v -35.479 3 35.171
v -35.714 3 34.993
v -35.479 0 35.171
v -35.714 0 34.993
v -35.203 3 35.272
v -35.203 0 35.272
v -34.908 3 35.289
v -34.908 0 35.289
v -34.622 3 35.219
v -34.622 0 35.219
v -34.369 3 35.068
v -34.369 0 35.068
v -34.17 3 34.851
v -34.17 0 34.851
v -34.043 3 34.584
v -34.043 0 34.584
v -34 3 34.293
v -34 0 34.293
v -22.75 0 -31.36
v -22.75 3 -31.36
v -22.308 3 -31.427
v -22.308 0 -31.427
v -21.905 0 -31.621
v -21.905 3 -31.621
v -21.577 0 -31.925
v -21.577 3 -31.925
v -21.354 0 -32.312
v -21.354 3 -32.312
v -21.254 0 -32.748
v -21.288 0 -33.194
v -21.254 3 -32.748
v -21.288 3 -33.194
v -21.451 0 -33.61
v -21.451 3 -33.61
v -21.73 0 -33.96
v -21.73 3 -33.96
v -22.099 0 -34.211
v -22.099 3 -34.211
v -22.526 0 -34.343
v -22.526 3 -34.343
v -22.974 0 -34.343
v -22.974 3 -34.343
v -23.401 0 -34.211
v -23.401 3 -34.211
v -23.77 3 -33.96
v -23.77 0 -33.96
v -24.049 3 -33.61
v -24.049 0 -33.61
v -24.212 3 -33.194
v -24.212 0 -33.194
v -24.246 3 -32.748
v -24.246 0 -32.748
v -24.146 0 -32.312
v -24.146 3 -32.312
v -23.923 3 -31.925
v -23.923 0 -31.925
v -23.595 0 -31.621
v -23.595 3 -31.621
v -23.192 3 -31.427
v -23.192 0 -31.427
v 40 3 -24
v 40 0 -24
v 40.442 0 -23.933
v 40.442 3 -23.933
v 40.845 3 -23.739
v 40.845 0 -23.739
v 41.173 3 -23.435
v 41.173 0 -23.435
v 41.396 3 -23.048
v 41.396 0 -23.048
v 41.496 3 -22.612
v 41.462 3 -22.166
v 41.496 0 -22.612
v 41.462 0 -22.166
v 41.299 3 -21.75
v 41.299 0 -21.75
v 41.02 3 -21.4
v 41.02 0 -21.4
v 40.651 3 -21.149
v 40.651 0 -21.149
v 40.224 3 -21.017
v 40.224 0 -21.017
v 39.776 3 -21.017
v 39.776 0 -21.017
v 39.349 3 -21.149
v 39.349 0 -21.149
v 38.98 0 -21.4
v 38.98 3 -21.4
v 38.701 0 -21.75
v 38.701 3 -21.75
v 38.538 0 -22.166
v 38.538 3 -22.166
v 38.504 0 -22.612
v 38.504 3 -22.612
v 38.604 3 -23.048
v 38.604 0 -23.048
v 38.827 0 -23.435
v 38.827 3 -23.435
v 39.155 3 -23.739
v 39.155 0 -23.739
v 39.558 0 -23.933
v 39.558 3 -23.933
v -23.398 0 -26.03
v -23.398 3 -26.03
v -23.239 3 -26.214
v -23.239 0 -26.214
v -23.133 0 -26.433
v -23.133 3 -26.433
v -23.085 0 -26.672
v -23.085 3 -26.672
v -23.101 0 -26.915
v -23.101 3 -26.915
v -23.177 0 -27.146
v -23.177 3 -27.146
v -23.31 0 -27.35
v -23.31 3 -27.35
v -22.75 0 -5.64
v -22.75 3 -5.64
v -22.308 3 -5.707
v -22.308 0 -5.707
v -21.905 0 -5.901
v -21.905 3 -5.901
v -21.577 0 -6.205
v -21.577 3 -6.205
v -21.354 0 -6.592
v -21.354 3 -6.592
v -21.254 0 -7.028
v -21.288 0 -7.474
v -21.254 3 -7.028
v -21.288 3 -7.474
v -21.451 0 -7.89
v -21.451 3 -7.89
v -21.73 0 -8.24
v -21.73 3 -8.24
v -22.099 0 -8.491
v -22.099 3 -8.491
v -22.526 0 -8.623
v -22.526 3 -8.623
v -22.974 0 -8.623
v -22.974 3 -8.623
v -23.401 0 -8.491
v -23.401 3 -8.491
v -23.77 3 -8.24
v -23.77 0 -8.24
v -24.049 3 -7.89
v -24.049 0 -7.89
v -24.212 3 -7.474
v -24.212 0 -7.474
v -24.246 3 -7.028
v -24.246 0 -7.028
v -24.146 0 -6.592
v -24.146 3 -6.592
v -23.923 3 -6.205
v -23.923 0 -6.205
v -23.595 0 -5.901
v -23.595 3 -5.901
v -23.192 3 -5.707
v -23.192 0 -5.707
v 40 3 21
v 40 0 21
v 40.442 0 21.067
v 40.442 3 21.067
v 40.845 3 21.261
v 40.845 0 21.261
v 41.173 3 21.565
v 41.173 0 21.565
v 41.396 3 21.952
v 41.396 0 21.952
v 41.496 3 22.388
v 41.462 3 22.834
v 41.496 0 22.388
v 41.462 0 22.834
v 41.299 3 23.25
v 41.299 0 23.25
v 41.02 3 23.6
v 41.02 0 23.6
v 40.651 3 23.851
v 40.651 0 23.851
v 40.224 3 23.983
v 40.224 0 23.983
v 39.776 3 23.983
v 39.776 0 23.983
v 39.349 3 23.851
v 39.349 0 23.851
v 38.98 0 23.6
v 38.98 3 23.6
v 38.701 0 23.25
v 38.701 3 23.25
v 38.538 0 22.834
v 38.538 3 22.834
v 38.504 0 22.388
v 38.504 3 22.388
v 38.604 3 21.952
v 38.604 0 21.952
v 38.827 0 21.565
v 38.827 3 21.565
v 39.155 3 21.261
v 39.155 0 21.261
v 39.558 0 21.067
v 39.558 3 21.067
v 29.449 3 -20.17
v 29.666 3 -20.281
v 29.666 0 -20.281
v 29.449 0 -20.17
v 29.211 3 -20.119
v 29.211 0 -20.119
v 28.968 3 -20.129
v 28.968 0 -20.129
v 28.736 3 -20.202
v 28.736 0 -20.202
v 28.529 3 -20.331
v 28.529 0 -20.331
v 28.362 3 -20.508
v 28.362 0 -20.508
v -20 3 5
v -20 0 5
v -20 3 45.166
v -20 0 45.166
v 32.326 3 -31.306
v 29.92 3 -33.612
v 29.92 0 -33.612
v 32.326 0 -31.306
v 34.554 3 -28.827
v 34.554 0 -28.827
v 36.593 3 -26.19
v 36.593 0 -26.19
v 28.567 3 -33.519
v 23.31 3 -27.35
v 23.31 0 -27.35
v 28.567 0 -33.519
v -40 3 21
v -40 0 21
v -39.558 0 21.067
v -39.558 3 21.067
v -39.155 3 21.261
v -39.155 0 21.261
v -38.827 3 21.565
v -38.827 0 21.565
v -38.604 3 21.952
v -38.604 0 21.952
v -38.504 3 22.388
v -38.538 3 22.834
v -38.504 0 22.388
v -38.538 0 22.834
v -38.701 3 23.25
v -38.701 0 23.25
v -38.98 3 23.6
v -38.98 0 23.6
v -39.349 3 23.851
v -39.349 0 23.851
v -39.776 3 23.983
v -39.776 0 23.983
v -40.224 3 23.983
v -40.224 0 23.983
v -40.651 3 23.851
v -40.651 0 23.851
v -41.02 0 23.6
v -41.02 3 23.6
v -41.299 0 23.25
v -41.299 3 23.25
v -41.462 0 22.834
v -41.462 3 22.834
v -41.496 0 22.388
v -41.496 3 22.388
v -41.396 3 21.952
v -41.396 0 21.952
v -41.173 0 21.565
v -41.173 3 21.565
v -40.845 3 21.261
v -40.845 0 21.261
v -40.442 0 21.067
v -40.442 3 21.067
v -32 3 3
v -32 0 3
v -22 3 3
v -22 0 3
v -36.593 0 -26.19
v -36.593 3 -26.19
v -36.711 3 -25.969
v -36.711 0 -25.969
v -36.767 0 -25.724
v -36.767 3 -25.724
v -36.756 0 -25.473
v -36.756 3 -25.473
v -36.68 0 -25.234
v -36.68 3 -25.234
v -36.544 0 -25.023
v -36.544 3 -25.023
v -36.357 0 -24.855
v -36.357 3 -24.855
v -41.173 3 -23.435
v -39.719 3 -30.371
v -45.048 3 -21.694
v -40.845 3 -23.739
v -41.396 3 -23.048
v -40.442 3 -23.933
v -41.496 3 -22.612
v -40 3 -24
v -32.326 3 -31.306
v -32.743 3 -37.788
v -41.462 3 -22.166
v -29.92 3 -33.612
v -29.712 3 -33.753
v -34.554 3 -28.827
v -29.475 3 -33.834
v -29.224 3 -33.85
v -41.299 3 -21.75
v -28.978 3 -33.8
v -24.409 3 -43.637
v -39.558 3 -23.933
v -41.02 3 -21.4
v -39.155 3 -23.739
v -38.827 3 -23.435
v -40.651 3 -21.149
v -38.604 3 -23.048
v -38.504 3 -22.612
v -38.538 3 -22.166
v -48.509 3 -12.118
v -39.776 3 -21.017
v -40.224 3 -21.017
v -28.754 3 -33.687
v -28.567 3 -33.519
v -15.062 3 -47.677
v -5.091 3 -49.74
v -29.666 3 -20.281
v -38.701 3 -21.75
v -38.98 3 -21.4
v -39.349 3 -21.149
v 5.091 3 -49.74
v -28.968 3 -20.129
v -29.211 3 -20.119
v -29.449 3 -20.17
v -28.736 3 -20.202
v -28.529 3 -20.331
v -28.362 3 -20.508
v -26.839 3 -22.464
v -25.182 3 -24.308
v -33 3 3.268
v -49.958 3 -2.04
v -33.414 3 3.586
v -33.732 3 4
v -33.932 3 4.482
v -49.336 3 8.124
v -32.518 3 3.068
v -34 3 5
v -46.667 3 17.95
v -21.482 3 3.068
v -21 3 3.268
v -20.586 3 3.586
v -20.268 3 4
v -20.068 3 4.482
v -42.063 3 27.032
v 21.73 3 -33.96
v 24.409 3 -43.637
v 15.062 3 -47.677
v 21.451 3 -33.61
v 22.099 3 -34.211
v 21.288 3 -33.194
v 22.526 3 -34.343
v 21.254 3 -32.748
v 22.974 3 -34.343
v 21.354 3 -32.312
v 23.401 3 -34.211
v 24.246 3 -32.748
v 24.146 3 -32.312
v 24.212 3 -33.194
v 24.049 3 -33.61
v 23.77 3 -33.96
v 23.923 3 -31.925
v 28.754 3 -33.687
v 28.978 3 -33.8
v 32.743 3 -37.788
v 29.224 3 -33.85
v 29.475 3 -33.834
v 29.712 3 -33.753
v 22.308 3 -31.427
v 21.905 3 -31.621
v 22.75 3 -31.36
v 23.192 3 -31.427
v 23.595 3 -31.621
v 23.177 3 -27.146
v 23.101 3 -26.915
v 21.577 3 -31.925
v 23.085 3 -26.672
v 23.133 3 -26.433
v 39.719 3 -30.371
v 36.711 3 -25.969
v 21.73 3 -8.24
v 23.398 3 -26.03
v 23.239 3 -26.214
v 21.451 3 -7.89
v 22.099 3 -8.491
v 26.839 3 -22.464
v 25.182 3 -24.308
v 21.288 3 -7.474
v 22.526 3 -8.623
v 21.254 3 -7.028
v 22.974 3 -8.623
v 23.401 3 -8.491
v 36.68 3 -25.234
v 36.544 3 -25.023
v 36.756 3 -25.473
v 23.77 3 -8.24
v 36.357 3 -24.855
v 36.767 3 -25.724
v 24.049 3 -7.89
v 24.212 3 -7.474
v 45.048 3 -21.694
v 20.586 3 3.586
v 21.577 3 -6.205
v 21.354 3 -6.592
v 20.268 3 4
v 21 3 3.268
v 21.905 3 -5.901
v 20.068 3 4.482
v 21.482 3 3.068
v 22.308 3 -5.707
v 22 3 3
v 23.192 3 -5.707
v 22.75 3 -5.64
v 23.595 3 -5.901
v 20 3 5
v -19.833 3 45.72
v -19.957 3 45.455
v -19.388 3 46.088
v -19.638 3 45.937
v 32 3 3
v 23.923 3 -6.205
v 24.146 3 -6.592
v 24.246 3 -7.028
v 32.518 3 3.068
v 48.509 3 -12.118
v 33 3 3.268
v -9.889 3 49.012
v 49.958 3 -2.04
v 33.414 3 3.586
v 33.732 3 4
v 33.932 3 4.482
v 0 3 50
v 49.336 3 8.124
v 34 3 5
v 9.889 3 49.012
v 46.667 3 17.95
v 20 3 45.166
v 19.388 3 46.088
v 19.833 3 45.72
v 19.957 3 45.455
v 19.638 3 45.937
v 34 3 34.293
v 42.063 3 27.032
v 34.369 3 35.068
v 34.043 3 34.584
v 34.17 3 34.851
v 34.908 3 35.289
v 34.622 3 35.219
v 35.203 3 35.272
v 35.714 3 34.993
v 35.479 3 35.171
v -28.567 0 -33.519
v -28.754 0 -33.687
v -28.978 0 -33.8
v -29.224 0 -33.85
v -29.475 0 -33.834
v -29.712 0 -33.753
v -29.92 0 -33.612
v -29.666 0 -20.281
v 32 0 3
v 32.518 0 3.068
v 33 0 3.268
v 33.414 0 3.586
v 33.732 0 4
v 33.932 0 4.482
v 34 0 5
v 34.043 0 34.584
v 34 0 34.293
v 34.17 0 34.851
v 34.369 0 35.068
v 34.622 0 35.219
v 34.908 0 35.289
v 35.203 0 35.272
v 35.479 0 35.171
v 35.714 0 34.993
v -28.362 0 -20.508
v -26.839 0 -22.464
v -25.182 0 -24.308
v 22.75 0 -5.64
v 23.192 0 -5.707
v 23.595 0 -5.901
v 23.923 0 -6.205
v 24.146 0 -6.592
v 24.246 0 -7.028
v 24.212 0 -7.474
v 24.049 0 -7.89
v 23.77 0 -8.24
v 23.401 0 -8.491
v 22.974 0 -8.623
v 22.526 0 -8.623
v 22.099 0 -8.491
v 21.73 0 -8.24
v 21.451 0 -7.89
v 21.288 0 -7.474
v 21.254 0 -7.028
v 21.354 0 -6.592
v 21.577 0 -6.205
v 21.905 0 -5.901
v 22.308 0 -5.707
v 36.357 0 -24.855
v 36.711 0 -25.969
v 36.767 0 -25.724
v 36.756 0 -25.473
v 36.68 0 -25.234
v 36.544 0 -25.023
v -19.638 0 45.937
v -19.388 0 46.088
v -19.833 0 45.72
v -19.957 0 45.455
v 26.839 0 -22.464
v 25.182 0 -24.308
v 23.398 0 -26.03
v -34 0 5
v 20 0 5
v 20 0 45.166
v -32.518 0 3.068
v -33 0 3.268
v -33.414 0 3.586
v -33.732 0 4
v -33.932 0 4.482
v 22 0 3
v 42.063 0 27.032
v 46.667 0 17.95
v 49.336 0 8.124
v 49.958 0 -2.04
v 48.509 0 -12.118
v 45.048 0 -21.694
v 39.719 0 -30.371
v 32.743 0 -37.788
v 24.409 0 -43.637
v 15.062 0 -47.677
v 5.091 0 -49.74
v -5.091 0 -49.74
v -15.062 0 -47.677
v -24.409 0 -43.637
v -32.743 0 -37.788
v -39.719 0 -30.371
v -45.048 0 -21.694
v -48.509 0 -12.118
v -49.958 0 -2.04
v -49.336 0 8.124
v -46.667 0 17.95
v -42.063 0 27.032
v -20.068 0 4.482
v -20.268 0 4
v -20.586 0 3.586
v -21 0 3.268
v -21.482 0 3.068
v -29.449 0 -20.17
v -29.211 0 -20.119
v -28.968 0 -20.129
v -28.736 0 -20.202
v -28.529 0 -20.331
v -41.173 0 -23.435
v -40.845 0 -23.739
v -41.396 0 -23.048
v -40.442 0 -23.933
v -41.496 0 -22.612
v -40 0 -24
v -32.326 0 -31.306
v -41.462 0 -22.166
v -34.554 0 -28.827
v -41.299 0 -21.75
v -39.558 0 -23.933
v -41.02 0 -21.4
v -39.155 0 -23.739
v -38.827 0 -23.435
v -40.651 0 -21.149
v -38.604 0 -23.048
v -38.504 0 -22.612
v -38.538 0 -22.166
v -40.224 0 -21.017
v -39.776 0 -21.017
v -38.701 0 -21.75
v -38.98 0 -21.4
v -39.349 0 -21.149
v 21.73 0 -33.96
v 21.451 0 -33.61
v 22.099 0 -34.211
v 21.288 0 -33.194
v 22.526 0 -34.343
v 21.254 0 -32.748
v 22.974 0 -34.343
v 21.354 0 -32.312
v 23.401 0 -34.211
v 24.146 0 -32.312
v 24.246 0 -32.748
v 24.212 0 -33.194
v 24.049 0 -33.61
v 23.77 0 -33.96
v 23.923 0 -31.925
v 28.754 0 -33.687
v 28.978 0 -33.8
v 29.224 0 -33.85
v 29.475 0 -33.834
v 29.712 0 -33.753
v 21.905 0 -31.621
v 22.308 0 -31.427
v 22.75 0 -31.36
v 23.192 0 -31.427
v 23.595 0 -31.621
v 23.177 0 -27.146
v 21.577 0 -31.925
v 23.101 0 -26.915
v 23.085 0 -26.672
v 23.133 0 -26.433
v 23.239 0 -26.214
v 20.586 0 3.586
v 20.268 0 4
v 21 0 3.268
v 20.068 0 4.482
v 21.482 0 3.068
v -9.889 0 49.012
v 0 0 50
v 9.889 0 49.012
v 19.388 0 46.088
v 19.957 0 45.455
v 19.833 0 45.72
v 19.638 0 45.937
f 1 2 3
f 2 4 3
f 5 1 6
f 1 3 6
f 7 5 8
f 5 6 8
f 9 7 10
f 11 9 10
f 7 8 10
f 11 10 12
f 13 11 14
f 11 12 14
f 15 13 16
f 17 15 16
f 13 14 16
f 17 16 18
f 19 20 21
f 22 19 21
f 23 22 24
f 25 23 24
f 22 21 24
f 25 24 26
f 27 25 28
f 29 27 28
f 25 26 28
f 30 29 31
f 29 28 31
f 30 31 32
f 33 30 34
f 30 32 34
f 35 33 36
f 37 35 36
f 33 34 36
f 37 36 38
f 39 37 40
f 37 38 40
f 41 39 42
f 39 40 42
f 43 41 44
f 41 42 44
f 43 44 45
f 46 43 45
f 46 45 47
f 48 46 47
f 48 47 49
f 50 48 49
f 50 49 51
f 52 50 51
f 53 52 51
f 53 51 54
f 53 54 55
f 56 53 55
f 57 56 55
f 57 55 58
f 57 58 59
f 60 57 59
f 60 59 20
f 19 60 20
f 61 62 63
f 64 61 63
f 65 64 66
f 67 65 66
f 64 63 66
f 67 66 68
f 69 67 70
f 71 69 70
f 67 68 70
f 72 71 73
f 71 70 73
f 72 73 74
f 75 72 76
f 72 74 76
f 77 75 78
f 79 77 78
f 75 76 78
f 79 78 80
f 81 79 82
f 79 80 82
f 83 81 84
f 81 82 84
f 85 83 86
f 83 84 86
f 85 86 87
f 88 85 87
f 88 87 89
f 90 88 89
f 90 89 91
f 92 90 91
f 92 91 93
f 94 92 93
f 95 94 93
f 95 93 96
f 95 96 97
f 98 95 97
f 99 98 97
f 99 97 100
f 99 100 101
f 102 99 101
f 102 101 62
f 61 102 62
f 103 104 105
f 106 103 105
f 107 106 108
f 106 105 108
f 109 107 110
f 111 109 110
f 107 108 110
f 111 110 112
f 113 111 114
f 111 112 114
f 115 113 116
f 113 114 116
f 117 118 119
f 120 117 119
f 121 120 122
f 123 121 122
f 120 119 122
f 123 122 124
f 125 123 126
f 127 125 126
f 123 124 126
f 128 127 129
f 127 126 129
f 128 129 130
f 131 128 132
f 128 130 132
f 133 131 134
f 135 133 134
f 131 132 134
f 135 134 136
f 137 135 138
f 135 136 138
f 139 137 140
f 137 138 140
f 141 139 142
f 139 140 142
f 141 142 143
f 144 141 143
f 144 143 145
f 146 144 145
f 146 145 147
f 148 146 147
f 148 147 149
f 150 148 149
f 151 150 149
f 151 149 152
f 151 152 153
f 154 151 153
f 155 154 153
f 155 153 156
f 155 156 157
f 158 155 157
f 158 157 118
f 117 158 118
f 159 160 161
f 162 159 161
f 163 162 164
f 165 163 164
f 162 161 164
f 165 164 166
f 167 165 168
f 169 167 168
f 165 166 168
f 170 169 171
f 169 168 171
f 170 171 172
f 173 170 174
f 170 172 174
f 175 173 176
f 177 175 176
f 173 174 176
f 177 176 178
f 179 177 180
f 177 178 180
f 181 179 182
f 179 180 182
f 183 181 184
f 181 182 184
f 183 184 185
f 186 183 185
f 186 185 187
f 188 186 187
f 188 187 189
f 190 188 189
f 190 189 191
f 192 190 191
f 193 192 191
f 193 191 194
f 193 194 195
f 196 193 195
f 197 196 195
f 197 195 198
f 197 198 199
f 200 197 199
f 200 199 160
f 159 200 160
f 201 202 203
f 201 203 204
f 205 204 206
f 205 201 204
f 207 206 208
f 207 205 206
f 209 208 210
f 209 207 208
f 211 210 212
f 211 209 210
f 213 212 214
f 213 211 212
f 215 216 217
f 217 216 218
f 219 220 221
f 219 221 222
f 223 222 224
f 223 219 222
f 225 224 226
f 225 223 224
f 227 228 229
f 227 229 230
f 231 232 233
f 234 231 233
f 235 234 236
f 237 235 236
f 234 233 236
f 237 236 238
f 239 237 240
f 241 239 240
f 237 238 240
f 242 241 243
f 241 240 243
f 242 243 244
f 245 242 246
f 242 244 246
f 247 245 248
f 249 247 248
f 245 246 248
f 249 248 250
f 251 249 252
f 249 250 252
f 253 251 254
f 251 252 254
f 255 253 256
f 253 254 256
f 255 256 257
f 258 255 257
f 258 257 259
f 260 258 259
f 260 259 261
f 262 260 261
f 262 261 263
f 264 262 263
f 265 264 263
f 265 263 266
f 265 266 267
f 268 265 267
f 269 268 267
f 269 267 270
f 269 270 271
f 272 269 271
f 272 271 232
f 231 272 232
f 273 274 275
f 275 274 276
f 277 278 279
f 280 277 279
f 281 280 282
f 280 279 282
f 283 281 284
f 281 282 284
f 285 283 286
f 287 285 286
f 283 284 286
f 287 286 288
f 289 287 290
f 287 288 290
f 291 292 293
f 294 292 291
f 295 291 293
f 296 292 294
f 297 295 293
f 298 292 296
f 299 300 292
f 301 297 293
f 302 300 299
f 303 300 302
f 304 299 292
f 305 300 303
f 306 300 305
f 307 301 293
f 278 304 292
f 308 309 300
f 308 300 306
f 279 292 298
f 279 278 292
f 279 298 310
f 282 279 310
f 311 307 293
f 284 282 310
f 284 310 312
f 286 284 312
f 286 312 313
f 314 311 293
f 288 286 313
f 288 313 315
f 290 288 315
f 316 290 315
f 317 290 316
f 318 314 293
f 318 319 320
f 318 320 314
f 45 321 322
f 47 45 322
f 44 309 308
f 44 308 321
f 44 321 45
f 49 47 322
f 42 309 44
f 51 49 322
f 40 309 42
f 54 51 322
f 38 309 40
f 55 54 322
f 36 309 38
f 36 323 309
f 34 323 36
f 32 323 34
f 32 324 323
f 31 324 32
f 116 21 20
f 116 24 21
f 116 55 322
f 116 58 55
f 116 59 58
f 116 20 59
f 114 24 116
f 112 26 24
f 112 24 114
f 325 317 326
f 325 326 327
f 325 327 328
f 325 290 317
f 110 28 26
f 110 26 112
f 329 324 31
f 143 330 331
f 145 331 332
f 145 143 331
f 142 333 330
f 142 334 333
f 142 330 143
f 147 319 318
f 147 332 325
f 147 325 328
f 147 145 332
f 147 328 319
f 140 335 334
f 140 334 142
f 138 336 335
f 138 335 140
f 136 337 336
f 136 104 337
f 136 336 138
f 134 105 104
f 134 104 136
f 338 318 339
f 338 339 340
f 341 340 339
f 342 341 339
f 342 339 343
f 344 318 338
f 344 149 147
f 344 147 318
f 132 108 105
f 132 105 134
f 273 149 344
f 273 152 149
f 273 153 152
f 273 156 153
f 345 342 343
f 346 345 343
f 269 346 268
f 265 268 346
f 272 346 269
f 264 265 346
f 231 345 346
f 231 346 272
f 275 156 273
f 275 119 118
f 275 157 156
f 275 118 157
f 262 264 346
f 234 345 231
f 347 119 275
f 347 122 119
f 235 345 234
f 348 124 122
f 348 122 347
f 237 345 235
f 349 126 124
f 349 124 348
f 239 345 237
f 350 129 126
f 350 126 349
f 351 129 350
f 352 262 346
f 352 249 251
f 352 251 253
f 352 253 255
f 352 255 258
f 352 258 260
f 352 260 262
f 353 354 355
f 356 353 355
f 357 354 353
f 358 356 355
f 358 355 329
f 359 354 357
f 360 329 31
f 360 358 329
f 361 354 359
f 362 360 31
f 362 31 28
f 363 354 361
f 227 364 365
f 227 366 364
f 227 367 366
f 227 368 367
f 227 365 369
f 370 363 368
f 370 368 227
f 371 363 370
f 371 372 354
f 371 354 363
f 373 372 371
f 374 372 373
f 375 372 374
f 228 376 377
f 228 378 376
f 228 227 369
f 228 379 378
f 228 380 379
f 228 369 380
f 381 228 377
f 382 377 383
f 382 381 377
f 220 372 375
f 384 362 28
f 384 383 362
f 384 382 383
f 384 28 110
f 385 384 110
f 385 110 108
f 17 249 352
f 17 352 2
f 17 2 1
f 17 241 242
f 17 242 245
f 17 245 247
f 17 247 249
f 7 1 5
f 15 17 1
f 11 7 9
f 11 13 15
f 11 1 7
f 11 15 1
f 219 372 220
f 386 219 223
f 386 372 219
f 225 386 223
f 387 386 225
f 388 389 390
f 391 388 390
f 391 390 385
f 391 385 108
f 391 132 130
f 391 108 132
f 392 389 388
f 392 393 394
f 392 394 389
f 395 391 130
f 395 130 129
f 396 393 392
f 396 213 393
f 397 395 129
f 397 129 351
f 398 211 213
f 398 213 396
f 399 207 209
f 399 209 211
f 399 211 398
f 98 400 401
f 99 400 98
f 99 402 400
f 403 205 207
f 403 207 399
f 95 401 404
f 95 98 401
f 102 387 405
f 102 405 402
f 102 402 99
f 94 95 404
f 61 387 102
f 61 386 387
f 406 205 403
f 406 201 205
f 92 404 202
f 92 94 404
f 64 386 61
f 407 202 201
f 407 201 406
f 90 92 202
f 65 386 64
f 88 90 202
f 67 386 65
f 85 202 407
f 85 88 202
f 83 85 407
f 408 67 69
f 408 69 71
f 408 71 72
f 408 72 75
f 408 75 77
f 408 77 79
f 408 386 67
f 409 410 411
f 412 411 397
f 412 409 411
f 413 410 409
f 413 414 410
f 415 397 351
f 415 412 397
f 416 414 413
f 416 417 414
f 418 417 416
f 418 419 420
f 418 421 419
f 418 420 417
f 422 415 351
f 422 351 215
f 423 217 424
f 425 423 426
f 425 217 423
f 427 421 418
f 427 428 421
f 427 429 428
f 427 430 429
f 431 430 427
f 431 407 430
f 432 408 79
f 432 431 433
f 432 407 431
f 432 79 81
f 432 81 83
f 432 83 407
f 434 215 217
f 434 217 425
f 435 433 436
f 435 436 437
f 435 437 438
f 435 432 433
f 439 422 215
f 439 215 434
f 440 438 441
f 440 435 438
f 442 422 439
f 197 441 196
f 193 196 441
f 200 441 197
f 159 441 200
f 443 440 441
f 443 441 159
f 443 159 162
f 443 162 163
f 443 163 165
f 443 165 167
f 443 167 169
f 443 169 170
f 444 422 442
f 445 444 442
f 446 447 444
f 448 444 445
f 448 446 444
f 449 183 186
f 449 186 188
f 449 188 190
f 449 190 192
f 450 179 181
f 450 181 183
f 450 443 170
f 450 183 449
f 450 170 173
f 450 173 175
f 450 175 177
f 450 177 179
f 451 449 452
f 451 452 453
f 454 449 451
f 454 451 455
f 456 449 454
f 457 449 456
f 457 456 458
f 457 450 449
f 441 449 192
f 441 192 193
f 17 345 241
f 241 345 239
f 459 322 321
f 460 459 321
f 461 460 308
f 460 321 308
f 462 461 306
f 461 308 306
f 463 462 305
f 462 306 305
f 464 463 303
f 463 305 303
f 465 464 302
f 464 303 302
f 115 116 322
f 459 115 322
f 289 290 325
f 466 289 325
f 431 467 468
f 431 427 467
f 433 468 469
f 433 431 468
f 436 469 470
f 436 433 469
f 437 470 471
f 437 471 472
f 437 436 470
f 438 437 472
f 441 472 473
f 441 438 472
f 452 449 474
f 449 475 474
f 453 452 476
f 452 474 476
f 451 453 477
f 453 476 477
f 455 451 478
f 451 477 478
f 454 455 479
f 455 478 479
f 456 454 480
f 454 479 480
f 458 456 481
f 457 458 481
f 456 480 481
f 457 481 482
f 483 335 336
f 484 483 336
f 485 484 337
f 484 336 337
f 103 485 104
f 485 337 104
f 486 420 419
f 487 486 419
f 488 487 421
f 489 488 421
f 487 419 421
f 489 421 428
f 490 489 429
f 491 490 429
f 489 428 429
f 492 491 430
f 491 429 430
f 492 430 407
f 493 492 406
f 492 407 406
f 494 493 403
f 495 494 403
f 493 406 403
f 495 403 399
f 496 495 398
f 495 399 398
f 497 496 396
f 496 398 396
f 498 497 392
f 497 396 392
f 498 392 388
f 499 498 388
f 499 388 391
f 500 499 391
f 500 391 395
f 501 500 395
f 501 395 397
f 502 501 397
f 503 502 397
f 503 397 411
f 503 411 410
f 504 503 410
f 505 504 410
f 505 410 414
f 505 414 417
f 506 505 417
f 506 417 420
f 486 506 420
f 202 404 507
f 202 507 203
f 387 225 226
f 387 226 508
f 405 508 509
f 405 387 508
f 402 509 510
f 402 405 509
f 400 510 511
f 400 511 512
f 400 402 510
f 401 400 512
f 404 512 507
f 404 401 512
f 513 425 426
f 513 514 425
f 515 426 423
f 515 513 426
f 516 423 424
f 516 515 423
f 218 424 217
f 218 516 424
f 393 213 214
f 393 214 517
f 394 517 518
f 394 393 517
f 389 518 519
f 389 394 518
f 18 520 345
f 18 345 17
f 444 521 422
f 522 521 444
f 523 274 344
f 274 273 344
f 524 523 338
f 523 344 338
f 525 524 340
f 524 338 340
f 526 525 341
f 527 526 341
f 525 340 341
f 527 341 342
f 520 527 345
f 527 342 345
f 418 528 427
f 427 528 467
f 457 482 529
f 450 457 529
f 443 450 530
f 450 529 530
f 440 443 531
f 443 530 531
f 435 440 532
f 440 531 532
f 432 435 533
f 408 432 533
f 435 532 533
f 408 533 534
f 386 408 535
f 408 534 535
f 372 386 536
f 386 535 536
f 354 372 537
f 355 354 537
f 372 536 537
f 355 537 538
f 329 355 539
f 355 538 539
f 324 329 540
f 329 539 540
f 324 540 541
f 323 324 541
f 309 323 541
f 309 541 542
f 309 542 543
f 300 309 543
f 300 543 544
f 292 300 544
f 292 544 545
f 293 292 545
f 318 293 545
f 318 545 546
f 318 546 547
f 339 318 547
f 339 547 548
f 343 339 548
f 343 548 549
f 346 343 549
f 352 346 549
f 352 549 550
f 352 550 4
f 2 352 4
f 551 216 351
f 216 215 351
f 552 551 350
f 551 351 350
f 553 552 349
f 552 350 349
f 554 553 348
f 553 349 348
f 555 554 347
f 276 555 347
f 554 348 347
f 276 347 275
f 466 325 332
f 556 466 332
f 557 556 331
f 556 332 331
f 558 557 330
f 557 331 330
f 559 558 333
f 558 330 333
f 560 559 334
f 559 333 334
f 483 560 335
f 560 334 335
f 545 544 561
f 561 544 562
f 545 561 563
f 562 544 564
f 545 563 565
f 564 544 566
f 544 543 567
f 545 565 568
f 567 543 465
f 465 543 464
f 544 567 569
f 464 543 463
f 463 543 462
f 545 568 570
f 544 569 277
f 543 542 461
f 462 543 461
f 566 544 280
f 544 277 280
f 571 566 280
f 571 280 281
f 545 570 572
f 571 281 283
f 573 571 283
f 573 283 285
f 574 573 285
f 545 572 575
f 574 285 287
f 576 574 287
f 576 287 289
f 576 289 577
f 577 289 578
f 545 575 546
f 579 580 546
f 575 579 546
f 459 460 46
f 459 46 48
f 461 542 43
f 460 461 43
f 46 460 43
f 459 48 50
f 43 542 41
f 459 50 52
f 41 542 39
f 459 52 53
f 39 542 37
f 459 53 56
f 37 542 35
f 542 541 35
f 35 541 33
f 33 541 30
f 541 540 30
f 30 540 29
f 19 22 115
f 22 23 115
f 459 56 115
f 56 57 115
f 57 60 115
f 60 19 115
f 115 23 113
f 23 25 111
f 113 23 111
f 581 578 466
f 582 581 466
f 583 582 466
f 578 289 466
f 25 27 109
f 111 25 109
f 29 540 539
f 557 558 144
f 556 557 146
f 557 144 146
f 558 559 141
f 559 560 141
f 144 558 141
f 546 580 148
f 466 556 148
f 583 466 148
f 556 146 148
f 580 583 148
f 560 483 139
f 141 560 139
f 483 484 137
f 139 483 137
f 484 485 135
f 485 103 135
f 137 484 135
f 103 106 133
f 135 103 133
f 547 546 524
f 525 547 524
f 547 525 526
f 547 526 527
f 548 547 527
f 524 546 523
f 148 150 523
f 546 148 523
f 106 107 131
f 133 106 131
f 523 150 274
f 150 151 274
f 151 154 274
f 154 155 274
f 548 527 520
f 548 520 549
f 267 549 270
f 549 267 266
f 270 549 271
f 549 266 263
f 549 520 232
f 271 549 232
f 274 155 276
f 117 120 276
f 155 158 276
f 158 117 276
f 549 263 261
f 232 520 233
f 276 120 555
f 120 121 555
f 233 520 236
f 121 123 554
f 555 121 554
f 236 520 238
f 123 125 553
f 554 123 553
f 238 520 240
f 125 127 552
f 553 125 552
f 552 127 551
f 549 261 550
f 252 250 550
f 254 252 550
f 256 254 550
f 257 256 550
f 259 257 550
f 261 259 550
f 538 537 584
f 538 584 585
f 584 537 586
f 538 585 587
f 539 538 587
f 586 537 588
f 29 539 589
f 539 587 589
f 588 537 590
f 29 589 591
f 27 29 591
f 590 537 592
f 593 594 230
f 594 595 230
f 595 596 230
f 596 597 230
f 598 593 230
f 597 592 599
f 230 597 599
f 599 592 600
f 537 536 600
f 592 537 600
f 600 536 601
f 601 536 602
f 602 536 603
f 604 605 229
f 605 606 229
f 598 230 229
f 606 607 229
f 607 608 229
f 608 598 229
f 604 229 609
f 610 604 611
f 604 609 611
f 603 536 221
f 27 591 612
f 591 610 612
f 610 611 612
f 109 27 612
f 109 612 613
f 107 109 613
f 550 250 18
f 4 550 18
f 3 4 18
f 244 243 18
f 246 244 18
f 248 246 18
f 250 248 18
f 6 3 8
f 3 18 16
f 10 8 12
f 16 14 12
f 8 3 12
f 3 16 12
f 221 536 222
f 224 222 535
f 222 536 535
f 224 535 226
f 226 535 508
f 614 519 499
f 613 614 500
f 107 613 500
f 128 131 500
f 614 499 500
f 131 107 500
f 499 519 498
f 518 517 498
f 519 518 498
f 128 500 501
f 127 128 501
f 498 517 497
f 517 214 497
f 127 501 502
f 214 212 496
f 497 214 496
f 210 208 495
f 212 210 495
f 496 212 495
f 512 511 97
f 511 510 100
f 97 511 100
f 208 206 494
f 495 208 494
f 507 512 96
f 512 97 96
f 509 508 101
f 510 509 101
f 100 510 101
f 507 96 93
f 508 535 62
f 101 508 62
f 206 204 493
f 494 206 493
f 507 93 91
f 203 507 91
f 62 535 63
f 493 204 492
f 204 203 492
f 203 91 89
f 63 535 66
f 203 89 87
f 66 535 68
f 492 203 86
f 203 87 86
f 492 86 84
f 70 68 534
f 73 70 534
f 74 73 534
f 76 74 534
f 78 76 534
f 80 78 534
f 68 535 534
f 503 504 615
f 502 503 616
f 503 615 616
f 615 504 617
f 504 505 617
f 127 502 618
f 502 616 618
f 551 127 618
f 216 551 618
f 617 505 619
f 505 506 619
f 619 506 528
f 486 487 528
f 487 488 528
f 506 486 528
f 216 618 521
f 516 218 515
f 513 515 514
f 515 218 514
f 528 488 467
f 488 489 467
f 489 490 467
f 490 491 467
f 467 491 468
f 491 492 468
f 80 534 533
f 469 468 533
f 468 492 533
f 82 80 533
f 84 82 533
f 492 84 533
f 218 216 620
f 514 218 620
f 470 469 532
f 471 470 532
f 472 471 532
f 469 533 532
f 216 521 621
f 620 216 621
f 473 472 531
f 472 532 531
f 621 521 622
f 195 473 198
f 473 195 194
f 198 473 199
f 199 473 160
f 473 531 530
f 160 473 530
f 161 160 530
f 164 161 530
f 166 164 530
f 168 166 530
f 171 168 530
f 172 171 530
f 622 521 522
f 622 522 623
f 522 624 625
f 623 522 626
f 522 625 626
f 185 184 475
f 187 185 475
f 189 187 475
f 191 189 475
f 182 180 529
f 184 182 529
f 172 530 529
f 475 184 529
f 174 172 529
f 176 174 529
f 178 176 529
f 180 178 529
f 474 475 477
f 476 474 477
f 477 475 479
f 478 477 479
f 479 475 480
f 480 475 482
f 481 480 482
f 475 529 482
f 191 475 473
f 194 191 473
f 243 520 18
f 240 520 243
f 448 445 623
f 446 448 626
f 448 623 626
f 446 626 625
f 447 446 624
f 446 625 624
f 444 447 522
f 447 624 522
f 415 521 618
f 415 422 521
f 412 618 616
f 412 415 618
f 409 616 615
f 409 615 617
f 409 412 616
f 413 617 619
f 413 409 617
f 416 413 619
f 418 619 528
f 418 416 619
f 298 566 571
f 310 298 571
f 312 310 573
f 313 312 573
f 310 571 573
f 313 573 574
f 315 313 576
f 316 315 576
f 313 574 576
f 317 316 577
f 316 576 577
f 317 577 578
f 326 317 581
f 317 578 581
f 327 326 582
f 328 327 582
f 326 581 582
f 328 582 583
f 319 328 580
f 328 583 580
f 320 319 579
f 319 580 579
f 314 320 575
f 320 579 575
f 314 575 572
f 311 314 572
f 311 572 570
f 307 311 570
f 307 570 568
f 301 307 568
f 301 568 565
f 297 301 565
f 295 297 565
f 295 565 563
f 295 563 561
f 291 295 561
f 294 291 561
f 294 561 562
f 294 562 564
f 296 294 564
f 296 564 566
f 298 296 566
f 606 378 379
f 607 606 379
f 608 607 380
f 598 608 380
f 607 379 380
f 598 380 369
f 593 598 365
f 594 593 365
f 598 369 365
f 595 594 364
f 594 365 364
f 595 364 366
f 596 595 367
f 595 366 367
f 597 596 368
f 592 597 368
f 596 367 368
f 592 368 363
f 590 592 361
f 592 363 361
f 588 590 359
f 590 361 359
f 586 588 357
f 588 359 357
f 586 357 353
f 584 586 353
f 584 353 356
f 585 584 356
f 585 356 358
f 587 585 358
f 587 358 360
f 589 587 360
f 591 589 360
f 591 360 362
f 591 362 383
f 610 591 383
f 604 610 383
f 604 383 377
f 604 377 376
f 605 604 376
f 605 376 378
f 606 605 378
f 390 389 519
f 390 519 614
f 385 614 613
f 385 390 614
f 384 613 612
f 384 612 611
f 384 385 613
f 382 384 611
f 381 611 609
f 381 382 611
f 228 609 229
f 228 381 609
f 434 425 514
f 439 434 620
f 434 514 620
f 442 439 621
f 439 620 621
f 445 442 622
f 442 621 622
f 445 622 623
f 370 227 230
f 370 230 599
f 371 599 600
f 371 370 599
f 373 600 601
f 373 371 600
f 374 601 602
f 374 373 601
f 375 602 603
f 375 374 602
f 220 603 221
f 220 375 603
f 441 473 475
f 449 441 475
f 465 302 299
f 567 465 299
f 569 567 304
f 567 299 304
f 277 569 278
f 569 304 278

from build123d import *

# Parameters (mm, degrees)
SKETCH1_R           = 50
BOSS_EXTRUDE1_DEPTH = 3
SKETCH2_R           = 1.5
CUT_EXTRUDE1_DEPTH  = 10
SKETCH3_W           = 14
SKETCH3_H           = 45
CUT_EXTRUDE2_DEPTH  = 10
FILLET1_R           = 1
SKETCH4_R           = 1.5
CUT_EXTRUDE3_DEPTH  = 10
FILLET2_R           = 2
CUT_EXTRUDE5_DEPTH  = 3


with BuildPart() as part:
    # Sketch1 → Boss-Extrude1 (new body)
    with BuildSketch(Plane(origin=(0, 0, 0), x_dir=(1, 0, 0), z_dir=(0, 1, 0))):
        with Locations(Location((0, 0, 0), (0, 0, 270))):
            Circle(SKETCH1_R)
    extrude(amount=BOSS_EXTRUDE1_DEPTH)

    # Sketch2 → Cut-Extrude1 (cut)
    with BuildSketch(Plane(origin=(0, 3, 0), x_dir=(1, 0, 0), z_dir=(0, 1, 0))):
        with Locations(Location((-22.75, 32.86, 0), (0, 0, 270))):
            Circle(SKETCH2_R)
        with Locations(Location((22.75, 32.86, 0), (0, 0, 270))):
            Circle(SKETCH2_R)
        with Locations(Location((22.75, 7.14, 0), (0, 0, 270))):
            Circle(SKETCH2_R)
        with Locations(Location((-22.75, 7.14, 0), (0, 0, 270))):
            Circle(SKETCH2_R)
    extrude(amount=-CUT_EXTRUDE1_DEPTH, mode=Mode.SUBTRACT)

    # Sketch3 → Cut-Extrude2 (cut)
    with BuildSketch(Plane.XZ):
        with Locations((-27, 25.5)):
            Rectangle(SKETCH3_W, SKETCH3_H)
        with Locations((27, 25.5)):
            Rectangle(SKETCH3_W, SKETCH3_H)
    extrude(amount=-CUT_EXTRUDE2_DEPTH, mode=Mode.SUBTRACT)

    # Fillet1
    fillet1_edges = [part.edges().sort_by_distance(p)[0] for p in [
        (-34, 1.5, 36.66060556),
        (-20, 1.5, 45.82575695),
        (34, 1.5, 36.66060556),
        (20, 1.5, 45.82575695),
    ]]
    fillet(fillet1_edges, radius=FILLET1_R)

    # Sketch4 → Cut-Extrude3 (cut)
    with BuildSketch(Plane.XZ):
        with Locations(Location((-40, 22.5, 0), (0, 0, 270))):
            Circle(SKETCH4_R)
        with Locations(Location((-40, -22.5, 0), (0, 0, 270))):
            Circle(SKETCH4_R)
        with Locations(Location((40, -22.5, 0), (0, 0, 270))):
            Circle(SKETCH4_R)
        with Locations(Location((40, 22.5, 0), (0, 0, 270))):
            Circle(SKETCH4_R)
    extrude(amount=-CUT_EXTRUDE3_DEPTH, mode=Mode.SUBTRACT)

    # Fillet2
    fillet2_edges = [part.edges().sort_by_distance(p)[0] for p in [
        (-34, 1.5, 3),
        (-20, 1.5, 3),
        (20, 1.5, 3),
        (34, 1.5, 3),
    ]]
    fillet(fillet2_edges, radius=FILLET2_R)

    # Sketch6 → Cut-Extrude5 (cut)
    with BuildSketch(Plane(origin=(0, 3, 0), x_dir=(1, 0, 0), z_dir=(0, 1, 0))):
        with BuildLine():
            Line((23.309994817, 27.350423227), (28.567392471, 33.519109752))
            ThreePointArc((28.567392471, 33.519109752), (29.22412311, 33.850150921), (29.920063035, 33.612346362))
            ThreePointArc((29.920063035, 33.612346362), (33.463097983, 30.086892052), (36.593306958, 26.190263189))
            ThreePointArc((36.593306958, 26.190263189), (36.756034947, 25.473044262), (36.357273652, 24.855085673))
            Line((36.357273652, 24.855085673), (29.666265874, 20.280882086))
            ThreePointArc((29.666265874, 20.280882086), (28.968053798, 20.129465624), (28.362226288, 20.508147649))
            ThreePointArc((28.362226288, 20.508147649), (26.026853987, 23.400916041), (23.397812241, 26.029644299))
            ThreePointArc((23.397812241, 26.029644299), (23.085451973, 26.672184656), (23.309994817, 27.350423227))
        make_face()
        with BuildLine():
            Line((-23.309994817, 27.350423227), (-28.567392471, 33.519109752))
            ThreePointArc((-28.567392471, 33.519109752), (-29.22412311, 33.850150921), (-29.920063035, 33.612346362))
            ThreePointArc((-29.920063035, 33.612346362), (-33.463097983, 30.086892052), (-36.593306958, 26.190263189))
            ThreePointArc((-36.593306958, 26.190263189), (-36.756034947, 25.473044262), (-36.357273652, 24.855085673))
            Line((-36.357273652, 24.855085673), (-29.666265874, 20.280882086))
            ThreePointArc((-29.666265874, 20.280882086), (-28.968053798, 20.129465624), (-28.362226288, 20.508147649))
            ThreePointArc((-28.362226288, 20.508147649), (-26.026853987, 23.400916041), (-23.397812241, 26.029644299))
            ThreePointArc((-23.397812241, 26.029644299), (-23.085451973, 26.672184656), (-23.309994817, 27.350423227))
        make_face()
    extrude(amount=-CUT_EXTRUDE5_DEPTH, mode=Mode.SUBTRACT)


solid = part.part
